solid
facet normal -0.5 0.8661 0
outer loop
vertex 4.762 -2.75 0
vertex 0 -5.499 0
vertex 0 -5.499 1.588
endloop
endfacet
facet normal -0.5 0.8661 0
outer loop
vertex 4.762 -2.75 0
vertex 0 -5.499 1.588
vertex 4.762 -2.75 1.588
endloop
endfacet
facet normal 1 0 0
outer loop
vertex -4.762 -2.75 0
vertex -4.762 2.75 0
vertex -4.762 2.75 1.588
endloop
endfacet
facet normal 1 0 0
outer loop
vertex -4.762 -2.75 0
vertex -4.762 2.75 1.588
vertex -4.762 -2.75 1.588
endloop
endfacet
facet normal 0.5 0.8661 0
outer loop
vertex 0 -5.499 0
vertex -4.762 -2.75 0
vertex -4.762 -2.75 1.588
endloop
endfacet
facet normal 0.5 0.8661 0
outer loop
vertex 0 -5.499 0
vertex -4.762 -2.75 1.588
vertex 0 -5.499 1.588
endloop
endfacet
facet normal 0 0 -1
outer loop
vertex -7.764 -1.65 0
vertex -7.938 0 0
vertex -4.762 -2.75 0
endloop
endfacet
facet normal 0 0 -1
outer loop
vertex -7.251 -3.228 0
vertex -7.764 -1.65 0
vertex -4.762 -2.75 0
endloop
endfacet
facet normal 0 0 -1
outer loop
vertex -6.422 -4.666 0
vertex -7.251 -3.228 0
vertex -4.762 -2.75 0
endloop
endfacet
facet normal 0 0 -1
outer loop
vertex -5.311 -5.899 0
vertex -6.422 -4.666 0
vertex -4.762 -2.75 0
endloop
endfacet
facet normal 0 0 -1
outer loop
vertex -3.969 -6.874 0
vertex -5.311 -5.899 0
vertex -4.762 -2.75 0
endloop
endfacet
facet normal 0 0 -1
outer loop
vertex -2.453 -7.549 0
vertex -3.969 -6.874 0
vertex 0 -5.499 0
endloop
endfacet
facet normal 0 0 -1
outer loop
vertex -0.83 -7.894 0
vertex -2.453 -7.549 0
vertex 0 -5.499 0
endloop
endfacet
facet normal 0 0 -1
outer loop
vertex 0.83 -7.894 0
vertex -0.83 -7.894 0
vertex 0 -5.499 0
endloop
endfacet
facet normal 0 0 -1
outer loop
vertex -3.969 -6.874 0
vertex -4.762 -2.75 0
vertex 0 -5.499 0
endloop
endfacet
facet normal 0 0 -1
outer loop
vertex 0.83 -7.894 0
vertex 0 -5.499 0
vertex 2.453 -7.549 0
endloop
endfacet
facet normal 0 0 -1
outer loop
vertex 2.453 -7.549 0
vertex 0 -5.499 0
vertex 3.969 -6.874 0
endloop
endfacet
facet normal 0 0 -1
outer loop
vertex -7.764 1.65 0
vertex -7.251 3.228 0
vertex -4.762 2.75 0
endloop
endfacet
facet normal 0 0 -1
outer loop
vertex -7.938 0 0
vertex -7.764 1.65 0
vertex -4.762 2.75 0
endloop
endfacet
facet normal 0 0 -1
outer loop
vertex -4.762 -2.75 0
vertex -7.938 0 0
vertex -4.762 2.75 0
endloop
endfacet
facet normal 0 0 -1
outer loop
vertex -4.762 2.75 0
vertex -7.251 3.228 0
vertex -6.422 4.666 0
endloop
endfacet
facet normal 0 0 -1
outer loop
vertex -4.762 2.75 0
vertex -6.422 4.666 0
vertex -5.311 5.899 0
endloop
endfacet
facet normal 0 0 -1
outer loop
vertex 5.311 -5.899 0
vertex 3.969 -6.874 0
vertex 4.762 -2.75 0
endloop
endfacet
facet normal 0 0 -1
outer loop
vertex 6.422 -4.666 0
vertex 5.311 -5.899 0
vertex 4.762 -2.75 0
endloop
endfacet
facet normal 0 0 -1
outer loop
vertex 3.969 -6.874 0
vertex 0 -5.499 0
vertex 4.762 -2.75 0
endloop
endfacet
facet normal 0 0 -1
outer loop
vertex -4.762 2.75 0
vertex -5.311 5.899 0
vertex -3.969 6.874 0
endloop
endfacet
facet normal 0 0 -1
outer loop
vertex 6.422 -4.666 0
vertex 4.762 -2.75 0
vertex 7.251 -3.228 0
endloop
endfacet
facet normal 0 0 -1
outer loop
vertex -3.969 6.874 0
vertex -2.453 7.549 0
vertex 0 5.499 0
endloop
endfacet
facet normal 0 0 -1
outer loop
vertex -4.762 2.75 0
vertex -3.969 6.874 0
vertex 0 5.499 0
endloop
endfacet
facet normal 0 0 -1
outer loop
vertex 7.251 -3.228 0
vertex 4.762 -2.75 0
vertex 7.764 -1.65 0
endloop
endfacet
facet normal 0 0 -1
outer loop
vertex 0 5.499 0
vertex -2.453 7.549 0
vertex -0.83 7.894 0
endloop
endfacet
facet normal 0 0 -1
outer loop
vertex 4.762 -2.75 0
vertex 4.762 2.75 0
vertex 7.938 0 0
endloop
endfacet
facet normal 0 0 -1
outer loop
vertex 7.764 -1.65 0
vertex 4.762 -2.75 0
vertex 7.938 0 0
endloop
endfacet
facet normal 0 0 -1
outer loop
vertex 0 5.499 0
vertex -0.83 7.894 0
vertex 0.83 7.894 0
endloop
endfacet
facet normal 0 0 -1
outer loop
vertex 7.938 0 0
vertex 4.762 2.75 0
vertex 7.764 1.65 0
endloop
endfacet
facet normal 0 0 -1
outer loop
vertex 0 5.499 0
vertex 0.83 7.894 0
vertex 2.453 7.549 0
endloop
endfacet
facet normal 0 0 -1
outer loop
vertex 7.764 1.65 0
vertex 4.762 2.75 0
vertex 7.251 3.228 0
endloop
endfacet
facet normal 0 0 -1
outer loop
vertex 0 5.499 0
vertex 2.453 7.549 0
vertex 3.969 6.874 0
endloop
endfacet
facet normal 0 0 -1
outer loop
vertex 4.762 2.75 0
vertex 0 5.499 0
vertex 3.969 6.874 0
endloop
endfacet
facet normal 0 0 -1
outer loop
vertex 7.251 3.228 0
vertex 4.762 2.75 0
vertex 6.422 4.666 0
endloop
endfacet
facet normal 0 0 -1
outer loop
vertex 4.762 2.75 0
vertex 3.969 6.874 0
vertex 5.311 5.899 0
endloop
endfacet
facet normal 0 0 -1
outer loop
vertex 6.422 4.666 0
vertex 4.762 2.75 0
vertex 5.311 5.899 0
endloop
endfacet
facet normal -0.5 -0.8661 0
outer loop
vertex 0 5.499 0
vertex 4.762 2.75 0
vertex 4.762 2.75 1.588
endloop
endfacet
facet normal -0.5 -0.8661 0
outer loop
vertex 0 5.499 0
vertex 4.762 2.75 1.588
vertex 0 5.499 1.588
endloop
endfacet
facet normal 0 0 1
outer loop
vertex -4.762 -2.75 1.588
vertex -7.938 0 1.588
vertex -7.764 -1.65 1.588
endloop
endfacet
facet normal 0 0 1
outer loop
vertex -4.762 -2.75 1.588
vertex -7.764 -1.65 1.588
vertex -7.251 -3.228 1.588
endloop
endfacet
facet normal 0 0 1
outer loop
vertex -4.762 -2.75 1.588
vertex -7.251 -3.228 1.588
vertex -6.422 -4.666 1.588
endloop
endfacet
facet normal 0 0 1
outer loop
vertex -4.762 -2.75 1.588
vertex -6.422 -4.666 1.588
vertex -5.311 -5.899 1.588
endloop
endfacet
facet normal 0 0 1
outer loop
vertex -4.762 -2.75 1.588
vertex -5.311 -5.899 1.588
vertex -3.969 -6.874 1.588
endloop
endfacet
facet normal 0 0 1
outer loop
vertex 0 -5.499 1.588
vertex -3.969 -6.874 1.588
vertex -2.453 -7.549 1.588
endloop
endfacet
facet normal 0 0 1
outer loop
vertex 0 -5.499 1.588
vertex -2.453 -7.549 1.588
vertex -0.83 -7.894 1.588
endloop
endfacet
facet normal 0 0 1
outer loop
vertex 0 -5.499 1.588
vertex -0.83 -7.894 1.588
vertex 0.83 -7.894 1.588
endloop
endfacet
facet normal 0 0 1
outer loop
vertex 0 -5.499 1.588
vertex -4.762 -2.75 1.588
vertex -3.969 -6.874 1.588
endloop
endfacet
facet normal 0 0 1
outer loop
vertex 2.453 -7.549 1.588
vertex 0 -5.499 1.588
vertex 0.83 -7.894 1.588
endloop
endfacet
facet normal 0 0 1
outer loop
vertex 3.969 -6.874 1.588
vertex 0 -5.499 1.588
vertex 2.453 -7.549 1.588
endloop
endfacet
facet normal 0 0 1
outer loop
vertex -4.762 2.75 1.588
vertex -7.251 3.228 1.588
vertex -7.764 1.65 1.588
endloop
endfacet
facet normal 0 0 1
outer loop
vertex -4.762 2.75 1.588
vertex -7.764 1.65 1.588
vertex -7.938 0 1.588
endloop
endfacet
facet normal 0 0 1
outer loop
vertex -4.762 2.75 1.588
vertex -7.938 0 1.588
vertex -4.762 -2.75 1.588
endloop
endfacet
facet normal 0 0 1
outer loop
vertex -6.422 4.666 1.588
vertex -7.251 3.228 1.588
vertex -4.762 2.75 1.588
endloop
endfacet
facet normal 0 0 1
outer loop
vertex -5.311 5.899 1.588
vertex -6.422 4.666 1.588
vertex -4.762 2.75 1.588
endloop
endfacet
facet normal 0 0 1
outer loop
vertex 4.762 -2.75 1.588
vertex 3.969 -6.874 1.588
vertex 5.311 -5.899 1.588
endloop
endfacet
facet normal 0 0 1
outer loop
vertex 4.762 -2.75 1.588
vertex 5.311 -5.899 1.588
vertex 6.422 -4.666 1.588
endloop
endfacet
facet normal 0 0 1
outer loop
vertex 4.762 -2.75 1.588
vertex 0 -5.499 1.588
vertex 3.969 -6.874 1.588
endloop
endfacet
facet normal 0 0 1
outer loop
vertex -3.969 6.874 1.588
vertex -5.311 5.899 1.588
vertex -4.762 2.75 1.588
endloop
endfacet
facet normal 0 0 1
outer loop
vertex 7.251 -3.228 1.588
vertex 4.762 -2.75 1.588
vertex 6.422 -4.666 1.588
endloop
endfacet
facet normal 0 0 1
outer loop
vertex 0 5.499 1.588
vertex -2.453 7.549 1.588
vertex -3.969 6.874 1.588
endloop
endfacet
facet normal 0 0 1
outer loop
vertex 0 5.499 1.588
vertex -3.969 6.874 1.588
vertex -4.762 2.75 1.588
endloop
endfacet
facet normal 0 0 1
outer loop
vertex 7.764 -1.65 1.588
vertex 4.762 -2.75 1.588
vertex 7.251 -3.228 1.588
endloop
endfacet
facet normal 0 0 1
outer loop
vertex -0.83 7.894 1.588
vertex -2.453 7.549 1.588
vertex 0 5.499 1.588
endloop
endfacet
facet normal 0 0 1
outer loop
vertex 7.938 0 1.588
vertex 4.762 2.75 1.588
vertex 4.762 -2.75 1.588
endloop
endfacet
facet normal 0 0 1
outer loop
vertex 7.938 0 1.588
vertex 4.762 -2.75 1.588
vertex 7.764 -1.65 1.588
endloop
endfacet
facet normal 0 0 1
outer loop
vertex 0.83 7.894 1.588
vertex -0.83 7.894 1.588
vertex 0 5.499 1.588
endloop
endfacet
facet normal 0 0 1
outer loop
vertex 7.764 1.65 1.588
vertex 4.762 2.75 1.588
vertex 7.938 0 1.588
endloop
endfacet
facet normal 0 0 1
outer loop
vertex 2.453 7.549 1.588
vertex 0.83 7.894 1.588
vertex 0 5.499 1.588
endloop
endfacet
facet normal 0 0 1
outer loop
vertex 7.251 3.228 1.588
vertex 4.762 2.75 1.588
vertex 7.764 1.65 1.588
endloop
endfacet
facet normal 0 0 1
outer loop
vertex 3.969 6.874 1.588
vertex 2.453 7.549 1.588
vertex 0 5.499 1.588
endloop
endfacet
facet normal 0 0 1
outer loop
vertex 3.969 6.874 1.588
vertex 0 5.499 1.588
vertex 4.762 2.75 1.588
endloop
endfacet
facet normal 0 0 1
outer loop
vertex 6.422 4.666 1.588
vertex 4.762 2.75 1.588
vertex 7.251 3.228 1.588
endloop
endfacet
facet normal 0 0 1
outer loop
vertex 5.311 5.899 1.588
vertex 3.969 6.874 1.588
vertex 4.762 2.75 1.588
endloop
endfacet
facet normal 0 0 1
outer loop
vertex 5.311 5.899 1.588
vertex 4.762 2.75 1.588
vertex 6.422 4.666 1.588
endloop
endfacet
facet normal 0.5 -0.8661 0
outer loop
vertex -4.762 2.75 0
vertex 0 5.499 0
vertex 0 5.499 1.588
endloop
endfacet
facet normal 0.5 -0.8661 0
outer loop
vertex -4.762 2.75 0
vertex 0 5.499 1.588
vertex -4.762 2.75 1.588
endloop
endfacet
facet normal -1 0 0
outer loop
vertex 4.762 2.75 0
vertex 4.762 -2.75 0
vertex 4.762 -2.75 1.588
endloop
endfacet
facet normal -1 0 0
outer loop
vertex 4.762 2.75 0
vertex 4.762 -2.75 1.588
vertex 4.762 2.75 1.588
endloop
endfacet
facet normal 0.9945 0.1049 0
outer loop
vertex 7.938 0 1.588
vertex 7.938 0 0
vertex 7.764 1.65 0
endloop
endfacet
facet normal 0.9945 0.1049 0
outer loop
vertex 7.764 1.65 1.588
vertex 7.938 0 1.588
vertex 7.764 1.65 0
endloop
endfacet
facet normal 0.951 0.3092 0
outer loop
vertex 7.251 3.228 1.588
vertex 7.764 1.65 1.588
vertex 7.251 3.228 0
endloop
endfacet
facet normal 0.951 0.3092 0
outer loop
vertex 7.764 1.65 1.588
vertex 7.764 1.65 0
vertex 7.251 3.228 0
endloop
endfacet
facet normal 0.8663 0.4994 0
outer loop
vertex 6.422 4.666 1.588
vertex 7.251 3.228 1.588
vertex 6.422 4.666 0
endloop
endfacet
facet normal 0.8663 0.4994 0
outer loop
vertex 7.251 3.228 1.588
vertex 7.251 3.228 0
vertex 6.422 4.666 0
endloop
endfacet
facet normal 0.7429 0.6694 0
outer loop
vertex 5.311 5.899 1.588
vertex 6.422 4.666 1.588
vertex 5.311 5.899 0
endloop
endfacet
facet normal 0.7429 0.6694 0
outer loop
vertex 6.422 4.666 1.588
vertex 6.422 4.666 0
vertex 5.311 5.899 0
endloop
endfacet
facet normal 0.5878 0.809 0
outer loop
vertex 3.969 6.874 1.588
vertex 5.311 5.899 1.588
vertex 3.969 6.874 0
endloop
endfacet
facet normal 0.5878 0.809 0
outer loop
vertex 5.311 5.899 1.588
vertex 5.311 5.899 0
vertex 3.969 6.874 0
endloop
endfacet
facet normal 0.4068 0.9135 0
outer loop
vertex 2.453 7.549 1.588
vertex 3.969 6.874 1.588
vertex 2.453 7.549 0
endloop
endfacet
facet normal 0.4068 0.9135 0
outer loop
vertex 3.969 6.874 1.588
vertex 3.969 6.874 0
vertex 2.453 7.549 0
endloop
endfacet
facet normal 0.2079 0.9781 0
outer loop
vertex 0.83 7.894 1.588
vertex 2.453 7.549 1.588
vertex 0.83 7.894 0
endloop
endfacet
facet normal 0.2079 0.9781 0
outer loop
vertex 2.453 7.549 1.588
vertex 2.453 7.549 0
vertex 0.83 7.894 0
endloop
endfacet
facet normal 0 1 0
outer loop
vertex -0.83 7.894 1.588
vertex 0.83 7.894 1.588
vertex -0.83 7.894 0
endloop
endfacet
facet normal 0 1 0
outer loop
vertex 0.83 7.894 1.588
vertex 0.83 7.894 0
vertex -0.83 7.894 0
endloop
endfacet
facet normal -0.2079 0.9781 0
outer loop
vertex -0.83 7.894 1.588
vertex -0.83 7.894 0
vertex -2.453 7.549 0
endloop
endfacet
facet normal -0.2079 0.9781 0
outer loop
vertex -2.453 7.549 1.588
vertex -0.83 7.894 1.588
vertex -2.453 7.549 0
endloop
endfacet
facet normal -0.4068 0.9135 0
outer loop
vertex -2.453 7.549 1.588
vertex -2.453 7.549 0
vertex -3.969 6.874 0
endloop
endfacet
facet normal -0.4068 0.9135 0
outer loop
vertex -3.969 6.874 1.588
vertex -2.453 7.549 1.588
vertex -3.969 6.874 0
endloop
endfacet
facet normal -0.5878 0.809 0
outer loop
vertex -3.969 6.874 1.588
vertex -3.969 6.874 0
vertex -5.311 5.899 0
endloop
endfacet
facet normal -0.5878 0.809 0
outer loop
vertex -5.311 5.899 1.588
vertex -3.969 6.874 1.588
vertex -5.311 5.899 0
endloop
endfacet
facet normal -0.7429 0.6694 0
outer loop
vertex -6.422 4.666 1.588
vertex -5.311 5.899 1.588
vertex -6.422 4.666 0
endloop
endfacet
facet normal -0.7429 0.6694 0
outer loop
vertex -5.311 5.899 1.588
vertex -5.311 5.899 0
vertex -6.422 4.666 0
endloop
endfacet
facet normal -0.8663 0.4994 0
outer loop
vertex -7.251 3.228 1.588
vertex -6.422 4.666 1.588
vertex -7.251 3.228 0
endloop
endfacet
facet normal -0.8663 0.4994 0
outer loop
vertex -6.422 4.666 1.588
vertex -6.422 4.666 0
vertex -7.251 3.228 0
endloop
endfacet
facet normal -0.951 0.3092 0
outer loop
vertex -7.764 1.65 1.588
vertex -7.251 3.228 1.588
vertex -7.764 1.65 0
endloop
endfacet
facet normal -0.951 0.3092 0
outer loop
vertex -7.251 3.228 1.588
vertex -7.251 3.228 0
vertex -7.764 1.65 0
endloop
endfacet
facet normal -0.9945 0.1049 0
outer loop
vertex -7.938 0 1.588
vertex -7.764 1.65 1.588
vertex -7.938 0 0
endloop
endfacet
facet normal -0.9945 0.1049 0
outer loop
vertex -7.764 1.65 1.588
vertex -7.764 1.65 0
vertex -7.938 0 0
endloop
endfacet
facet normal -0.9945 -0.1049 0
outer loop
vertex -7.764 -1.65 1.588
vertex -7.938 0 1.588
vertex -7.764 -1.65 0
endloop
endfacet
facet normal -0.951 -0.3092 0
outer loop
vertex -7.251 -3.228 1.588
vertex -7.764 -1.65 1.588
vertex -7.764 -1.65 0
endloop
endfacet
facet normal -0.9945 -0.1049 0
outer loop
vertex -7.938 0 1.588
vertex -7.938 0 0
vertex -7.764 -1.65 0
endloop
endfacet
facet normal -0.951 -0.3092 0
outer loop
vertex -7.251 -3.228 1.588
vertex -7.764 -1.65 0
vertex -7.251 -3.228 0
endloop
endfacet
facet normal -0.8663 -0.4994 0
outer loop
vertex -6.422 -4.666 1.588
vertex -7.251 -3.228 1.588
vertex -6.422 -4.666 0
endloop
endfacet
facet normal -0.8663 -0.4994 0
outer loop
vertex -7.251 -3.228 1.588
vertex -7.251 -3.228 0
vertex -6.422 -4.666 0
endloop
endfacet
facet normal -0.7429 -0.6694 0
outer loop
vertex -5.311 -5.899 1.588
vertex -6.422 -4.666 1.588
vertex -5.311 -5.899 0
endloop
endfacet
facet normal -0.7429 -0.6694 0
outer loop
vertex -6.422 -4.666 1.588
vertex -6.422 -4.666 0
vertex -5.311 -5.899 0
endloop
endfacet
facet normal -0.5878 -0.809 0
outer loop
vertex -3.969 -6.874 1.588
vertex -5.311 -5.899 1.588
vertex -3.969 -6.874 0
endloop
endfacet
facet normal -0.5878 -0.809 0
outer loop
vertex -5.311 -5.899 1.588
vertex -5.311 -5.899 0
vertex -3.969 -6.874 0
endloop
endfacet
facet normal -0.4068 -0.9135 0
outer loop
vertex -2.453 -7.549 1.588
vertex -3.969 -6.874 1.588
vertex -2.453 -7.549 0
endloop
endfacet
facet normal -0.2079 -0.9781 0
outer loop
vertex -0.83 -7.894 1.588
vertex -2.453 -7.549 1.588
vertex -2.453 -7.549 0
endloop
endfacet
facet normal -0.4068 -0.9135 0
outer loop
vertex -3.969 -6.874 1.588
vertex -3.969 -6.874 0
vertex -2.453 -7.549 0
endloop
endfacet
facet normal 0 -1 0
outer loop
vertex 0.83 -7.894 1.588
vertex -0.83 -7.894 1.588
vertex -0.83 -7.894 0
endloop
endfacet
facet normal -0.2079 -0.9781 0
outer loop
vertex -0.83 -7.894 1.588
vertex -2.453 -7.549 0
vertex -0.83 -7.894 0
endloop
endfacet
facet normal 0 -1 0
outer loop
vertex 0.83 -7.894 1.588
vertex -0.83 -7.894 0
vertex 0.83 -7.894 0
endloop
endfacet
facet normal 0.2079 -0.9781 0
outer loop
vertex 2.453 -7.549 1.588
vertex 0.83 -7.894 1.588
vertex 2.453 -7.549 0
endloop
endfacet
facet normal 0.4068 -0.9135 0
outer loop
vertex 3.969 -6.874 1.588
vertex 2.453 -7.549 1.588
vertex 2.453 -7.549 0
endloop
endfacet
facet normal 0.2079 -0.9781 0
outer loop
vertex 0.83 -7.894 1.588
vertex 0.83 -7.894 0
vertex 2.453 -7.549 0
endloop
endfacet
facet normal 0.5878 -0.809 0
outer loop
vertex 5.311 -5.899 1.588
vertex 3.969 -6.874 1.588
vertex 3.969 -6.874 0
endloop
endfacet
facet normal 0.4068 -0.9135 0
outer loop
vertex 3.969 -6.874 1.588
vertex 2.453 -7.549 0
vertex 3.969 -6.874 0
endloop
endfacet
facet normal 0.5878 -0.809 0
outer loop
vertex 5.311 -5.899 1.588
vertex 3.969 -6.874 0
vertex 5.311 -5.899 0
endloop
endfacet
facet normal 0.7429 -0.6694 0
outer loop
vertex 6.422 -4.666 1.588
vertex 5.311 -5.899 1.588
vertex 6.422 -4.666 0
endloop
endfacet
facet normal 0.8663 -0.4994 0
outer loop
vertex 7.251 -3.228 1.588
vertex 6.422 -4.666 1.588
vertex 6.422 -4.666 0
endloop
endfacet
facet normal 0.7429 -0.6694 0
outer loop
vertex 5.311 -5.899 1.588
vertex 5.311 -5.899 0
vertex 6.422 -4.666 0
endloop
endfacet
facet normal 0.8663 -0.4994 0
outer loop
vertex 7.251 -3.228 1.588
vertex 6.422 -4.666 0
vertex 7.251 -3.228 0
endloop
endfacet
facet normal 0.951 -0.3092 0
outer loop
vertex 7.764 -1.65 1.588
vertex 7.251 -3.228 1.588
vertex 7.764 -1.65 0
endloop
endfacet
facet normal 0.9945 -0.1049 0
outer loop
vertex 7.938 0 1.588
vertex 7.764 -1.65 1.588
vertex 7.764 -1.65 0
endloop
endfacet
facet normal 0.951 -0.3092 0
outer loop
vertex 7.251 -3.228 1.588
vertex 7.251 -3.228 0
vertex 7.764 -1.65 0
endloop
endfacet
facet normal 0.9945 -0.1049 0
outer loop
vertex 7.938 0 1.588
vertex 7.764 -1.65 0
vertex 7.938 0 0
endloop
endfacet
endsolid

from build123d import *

# Parameters (mm, degrees)
SKETCH1_R         = 7.9375
SPACER_BOSS_DEPTH = 1.5875


with BuildPart() as part:
    # Sketch1 → Spacer Boss (new body)
    with BuildSketch(Plane.XY):
        Circle(SKETCH1_R)
        Polygon((-4.7625, 2.749630657), (-4.7625, -2.749630657), (0, -5.499261314), (4.7625, -2.749630657), (4.7625, 2.749630657), (0, 5.499261314), align=None, mode=Mode.SUBTRACT)
    extrude(amount=SPACER_BOSS_DEPTH)


solid = part.part
